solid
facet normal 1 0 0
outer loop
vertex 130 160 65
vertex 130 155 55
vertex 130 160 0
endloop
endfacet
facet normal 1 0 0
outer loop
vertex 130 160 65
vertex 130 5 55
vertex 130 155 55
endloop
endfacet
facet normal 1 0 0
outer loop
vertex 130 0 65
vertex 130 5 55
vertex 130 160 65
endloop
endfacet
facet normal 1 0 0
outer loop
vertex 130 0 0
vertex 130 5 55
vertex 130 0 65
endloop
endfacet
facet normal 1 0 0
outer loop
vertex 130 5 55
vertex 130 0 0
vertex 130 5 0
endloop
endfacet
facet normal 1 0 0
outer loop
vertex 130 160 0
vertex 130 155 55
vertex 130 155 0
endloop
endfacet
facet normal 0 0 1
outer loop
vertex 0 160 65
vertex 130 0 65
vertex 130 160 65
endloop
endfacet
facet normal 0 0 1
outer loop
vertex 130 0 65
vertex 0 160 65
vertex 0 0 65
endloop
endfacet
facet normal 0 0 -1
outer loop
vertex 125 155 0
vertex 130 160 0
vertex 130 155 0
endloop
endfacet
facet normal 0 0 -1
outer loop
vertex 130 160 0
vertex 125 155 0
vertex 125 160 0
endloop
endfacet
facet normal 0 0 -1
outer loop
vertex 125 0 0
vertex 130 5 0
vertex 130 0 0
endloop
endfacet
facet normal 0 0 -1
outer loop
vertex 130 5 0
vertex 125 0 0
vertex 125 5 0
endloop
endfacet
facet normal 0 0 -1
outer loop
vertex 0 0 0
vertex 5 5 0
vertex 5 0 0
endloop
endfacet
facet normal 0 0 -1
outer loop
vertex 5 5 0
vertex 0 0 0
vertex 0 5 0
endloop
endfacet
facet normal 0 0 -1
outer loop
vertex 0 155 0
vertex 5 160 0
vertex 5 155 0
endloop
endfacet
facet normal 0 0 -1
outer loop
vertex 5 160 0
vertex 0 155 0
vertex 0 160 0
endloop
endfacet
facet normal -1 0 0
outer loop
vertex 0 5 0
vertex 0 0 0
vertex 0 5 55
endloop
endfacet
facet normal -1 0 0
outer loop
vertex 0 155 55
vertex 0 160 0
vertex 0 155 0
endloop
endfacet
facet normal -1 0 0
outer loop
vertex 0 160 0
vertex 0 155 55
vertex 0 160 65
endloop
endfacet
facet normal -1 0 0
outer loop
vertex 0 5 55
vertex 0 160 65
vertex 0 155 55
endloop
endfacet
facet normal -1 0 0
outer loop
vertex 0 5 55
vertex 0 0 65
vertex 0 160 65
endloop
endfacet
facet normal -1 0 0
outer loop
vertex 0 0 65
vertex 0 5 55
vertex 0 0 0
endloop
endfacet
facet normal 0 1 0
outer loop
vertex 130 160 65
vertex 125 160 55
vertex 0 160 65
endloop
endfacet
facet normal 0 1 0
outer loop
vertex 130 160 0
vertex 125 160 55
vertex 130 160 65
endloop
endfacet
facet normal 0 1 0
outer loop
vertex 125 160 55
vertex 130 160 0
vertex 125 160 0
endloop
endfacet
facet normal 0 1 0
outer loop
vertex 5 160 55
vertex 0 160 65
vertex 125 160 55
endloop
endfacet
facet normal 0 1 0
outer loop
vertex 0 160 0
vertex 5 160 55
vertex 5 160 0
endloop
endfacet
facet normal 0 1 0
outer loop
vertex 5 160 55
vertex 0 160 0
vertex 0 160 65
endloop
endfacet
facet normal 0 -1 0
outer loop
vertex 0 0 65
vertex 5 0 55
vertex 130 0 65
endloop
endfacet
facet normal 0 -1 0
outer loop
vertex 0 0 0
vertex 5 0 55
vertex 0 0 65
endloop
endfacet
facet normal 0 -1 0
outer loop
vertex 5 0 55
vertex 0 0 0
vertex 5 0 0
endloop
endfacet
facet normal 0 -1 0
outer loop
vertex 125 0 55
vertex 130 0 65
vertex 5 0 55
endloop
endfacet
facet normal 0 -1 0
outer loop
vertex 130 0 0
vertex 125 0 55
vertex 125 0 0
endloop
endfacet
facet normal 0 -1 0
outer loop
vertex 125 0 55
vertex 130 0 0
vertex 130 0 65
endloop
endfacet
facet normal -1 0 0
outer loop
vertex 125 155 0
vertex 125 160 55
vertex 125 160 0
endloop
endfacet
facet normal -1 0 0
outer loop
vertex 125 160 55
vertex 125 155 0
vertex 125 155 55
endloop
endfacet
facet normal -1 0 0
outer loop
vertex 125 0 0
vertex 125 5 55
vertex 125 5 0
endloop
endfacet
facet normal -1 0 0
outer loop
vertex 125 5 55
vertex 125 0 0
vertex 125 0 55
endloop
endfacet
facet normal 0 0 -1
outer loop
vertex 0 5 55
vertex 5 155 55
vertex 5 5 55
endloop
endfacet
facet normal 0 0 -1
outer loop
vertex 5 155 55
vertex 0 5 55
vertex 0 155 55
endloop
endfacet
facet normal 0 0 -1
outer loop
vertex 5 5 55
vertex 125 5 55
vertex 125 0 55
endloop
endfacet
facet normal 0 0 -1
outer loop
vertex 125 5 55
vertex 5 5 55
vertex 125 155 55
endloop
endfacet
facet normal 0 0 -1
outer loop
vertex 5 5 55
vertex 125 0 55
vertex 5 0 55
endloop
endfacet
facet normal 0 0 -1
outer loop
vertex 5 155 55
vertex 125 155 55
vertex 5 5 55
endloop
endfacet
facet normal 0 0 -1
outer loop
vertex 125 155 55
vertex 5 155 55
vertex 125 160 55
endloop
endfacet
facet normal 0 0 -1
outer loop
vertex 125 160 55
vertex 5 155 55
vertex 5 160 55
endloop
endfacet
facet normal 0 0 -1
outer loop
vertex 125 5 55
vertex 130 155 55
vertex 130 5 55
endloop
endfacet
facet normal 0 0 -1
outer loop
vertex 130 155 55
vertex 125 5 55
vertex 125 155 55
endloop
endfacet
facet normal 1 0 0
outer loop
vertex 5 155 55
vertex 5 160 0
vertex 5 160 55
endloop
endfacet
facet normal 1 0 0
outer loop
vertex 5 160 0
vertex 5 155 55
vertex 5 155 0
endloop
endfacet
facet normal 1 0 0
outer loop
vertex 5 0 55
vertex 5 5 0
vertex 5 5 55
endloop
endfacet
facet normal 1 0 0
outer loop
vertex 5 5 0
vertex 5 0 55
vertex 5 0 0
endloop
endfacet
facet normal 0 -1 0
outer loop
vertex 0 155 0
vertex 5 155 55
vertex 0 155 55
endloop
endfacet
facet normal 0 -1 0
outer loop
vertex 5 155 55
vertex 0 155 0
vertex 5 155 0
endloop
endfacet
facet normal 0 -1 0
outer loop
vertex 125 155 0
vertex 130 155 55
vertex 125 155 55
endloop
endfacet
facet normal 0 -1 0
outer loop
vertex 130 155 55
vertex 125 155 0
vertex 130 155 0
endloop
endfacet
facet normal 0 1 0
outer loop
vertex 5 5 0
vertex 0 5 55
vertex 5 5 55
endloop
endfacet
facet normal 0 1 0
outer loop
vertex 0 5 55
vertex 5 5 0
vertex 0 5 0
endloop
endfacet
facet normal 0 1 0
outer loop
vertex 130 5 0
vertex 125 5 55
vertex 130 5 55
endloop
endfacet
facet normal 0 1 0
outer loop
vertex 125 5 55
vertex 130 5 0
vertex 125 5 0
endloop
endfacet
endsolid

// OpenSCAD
BoxZ=60;
BoxY=150;
BoxX=120;
Wall=5;
DW=Wall*2;
QW=Wall*4;

difference()
{
  cube([BoxX+DW,BoxY+DW,BoxZ+Wall]);
  translate([Wall,-Wall,-Wall]) cube([BoxX,BoxY+QW,BoxZ]);
  translate([-Wall,Wall,-Wall]) cube([BoxX+QW,BoxY,BoxZ]);
}
